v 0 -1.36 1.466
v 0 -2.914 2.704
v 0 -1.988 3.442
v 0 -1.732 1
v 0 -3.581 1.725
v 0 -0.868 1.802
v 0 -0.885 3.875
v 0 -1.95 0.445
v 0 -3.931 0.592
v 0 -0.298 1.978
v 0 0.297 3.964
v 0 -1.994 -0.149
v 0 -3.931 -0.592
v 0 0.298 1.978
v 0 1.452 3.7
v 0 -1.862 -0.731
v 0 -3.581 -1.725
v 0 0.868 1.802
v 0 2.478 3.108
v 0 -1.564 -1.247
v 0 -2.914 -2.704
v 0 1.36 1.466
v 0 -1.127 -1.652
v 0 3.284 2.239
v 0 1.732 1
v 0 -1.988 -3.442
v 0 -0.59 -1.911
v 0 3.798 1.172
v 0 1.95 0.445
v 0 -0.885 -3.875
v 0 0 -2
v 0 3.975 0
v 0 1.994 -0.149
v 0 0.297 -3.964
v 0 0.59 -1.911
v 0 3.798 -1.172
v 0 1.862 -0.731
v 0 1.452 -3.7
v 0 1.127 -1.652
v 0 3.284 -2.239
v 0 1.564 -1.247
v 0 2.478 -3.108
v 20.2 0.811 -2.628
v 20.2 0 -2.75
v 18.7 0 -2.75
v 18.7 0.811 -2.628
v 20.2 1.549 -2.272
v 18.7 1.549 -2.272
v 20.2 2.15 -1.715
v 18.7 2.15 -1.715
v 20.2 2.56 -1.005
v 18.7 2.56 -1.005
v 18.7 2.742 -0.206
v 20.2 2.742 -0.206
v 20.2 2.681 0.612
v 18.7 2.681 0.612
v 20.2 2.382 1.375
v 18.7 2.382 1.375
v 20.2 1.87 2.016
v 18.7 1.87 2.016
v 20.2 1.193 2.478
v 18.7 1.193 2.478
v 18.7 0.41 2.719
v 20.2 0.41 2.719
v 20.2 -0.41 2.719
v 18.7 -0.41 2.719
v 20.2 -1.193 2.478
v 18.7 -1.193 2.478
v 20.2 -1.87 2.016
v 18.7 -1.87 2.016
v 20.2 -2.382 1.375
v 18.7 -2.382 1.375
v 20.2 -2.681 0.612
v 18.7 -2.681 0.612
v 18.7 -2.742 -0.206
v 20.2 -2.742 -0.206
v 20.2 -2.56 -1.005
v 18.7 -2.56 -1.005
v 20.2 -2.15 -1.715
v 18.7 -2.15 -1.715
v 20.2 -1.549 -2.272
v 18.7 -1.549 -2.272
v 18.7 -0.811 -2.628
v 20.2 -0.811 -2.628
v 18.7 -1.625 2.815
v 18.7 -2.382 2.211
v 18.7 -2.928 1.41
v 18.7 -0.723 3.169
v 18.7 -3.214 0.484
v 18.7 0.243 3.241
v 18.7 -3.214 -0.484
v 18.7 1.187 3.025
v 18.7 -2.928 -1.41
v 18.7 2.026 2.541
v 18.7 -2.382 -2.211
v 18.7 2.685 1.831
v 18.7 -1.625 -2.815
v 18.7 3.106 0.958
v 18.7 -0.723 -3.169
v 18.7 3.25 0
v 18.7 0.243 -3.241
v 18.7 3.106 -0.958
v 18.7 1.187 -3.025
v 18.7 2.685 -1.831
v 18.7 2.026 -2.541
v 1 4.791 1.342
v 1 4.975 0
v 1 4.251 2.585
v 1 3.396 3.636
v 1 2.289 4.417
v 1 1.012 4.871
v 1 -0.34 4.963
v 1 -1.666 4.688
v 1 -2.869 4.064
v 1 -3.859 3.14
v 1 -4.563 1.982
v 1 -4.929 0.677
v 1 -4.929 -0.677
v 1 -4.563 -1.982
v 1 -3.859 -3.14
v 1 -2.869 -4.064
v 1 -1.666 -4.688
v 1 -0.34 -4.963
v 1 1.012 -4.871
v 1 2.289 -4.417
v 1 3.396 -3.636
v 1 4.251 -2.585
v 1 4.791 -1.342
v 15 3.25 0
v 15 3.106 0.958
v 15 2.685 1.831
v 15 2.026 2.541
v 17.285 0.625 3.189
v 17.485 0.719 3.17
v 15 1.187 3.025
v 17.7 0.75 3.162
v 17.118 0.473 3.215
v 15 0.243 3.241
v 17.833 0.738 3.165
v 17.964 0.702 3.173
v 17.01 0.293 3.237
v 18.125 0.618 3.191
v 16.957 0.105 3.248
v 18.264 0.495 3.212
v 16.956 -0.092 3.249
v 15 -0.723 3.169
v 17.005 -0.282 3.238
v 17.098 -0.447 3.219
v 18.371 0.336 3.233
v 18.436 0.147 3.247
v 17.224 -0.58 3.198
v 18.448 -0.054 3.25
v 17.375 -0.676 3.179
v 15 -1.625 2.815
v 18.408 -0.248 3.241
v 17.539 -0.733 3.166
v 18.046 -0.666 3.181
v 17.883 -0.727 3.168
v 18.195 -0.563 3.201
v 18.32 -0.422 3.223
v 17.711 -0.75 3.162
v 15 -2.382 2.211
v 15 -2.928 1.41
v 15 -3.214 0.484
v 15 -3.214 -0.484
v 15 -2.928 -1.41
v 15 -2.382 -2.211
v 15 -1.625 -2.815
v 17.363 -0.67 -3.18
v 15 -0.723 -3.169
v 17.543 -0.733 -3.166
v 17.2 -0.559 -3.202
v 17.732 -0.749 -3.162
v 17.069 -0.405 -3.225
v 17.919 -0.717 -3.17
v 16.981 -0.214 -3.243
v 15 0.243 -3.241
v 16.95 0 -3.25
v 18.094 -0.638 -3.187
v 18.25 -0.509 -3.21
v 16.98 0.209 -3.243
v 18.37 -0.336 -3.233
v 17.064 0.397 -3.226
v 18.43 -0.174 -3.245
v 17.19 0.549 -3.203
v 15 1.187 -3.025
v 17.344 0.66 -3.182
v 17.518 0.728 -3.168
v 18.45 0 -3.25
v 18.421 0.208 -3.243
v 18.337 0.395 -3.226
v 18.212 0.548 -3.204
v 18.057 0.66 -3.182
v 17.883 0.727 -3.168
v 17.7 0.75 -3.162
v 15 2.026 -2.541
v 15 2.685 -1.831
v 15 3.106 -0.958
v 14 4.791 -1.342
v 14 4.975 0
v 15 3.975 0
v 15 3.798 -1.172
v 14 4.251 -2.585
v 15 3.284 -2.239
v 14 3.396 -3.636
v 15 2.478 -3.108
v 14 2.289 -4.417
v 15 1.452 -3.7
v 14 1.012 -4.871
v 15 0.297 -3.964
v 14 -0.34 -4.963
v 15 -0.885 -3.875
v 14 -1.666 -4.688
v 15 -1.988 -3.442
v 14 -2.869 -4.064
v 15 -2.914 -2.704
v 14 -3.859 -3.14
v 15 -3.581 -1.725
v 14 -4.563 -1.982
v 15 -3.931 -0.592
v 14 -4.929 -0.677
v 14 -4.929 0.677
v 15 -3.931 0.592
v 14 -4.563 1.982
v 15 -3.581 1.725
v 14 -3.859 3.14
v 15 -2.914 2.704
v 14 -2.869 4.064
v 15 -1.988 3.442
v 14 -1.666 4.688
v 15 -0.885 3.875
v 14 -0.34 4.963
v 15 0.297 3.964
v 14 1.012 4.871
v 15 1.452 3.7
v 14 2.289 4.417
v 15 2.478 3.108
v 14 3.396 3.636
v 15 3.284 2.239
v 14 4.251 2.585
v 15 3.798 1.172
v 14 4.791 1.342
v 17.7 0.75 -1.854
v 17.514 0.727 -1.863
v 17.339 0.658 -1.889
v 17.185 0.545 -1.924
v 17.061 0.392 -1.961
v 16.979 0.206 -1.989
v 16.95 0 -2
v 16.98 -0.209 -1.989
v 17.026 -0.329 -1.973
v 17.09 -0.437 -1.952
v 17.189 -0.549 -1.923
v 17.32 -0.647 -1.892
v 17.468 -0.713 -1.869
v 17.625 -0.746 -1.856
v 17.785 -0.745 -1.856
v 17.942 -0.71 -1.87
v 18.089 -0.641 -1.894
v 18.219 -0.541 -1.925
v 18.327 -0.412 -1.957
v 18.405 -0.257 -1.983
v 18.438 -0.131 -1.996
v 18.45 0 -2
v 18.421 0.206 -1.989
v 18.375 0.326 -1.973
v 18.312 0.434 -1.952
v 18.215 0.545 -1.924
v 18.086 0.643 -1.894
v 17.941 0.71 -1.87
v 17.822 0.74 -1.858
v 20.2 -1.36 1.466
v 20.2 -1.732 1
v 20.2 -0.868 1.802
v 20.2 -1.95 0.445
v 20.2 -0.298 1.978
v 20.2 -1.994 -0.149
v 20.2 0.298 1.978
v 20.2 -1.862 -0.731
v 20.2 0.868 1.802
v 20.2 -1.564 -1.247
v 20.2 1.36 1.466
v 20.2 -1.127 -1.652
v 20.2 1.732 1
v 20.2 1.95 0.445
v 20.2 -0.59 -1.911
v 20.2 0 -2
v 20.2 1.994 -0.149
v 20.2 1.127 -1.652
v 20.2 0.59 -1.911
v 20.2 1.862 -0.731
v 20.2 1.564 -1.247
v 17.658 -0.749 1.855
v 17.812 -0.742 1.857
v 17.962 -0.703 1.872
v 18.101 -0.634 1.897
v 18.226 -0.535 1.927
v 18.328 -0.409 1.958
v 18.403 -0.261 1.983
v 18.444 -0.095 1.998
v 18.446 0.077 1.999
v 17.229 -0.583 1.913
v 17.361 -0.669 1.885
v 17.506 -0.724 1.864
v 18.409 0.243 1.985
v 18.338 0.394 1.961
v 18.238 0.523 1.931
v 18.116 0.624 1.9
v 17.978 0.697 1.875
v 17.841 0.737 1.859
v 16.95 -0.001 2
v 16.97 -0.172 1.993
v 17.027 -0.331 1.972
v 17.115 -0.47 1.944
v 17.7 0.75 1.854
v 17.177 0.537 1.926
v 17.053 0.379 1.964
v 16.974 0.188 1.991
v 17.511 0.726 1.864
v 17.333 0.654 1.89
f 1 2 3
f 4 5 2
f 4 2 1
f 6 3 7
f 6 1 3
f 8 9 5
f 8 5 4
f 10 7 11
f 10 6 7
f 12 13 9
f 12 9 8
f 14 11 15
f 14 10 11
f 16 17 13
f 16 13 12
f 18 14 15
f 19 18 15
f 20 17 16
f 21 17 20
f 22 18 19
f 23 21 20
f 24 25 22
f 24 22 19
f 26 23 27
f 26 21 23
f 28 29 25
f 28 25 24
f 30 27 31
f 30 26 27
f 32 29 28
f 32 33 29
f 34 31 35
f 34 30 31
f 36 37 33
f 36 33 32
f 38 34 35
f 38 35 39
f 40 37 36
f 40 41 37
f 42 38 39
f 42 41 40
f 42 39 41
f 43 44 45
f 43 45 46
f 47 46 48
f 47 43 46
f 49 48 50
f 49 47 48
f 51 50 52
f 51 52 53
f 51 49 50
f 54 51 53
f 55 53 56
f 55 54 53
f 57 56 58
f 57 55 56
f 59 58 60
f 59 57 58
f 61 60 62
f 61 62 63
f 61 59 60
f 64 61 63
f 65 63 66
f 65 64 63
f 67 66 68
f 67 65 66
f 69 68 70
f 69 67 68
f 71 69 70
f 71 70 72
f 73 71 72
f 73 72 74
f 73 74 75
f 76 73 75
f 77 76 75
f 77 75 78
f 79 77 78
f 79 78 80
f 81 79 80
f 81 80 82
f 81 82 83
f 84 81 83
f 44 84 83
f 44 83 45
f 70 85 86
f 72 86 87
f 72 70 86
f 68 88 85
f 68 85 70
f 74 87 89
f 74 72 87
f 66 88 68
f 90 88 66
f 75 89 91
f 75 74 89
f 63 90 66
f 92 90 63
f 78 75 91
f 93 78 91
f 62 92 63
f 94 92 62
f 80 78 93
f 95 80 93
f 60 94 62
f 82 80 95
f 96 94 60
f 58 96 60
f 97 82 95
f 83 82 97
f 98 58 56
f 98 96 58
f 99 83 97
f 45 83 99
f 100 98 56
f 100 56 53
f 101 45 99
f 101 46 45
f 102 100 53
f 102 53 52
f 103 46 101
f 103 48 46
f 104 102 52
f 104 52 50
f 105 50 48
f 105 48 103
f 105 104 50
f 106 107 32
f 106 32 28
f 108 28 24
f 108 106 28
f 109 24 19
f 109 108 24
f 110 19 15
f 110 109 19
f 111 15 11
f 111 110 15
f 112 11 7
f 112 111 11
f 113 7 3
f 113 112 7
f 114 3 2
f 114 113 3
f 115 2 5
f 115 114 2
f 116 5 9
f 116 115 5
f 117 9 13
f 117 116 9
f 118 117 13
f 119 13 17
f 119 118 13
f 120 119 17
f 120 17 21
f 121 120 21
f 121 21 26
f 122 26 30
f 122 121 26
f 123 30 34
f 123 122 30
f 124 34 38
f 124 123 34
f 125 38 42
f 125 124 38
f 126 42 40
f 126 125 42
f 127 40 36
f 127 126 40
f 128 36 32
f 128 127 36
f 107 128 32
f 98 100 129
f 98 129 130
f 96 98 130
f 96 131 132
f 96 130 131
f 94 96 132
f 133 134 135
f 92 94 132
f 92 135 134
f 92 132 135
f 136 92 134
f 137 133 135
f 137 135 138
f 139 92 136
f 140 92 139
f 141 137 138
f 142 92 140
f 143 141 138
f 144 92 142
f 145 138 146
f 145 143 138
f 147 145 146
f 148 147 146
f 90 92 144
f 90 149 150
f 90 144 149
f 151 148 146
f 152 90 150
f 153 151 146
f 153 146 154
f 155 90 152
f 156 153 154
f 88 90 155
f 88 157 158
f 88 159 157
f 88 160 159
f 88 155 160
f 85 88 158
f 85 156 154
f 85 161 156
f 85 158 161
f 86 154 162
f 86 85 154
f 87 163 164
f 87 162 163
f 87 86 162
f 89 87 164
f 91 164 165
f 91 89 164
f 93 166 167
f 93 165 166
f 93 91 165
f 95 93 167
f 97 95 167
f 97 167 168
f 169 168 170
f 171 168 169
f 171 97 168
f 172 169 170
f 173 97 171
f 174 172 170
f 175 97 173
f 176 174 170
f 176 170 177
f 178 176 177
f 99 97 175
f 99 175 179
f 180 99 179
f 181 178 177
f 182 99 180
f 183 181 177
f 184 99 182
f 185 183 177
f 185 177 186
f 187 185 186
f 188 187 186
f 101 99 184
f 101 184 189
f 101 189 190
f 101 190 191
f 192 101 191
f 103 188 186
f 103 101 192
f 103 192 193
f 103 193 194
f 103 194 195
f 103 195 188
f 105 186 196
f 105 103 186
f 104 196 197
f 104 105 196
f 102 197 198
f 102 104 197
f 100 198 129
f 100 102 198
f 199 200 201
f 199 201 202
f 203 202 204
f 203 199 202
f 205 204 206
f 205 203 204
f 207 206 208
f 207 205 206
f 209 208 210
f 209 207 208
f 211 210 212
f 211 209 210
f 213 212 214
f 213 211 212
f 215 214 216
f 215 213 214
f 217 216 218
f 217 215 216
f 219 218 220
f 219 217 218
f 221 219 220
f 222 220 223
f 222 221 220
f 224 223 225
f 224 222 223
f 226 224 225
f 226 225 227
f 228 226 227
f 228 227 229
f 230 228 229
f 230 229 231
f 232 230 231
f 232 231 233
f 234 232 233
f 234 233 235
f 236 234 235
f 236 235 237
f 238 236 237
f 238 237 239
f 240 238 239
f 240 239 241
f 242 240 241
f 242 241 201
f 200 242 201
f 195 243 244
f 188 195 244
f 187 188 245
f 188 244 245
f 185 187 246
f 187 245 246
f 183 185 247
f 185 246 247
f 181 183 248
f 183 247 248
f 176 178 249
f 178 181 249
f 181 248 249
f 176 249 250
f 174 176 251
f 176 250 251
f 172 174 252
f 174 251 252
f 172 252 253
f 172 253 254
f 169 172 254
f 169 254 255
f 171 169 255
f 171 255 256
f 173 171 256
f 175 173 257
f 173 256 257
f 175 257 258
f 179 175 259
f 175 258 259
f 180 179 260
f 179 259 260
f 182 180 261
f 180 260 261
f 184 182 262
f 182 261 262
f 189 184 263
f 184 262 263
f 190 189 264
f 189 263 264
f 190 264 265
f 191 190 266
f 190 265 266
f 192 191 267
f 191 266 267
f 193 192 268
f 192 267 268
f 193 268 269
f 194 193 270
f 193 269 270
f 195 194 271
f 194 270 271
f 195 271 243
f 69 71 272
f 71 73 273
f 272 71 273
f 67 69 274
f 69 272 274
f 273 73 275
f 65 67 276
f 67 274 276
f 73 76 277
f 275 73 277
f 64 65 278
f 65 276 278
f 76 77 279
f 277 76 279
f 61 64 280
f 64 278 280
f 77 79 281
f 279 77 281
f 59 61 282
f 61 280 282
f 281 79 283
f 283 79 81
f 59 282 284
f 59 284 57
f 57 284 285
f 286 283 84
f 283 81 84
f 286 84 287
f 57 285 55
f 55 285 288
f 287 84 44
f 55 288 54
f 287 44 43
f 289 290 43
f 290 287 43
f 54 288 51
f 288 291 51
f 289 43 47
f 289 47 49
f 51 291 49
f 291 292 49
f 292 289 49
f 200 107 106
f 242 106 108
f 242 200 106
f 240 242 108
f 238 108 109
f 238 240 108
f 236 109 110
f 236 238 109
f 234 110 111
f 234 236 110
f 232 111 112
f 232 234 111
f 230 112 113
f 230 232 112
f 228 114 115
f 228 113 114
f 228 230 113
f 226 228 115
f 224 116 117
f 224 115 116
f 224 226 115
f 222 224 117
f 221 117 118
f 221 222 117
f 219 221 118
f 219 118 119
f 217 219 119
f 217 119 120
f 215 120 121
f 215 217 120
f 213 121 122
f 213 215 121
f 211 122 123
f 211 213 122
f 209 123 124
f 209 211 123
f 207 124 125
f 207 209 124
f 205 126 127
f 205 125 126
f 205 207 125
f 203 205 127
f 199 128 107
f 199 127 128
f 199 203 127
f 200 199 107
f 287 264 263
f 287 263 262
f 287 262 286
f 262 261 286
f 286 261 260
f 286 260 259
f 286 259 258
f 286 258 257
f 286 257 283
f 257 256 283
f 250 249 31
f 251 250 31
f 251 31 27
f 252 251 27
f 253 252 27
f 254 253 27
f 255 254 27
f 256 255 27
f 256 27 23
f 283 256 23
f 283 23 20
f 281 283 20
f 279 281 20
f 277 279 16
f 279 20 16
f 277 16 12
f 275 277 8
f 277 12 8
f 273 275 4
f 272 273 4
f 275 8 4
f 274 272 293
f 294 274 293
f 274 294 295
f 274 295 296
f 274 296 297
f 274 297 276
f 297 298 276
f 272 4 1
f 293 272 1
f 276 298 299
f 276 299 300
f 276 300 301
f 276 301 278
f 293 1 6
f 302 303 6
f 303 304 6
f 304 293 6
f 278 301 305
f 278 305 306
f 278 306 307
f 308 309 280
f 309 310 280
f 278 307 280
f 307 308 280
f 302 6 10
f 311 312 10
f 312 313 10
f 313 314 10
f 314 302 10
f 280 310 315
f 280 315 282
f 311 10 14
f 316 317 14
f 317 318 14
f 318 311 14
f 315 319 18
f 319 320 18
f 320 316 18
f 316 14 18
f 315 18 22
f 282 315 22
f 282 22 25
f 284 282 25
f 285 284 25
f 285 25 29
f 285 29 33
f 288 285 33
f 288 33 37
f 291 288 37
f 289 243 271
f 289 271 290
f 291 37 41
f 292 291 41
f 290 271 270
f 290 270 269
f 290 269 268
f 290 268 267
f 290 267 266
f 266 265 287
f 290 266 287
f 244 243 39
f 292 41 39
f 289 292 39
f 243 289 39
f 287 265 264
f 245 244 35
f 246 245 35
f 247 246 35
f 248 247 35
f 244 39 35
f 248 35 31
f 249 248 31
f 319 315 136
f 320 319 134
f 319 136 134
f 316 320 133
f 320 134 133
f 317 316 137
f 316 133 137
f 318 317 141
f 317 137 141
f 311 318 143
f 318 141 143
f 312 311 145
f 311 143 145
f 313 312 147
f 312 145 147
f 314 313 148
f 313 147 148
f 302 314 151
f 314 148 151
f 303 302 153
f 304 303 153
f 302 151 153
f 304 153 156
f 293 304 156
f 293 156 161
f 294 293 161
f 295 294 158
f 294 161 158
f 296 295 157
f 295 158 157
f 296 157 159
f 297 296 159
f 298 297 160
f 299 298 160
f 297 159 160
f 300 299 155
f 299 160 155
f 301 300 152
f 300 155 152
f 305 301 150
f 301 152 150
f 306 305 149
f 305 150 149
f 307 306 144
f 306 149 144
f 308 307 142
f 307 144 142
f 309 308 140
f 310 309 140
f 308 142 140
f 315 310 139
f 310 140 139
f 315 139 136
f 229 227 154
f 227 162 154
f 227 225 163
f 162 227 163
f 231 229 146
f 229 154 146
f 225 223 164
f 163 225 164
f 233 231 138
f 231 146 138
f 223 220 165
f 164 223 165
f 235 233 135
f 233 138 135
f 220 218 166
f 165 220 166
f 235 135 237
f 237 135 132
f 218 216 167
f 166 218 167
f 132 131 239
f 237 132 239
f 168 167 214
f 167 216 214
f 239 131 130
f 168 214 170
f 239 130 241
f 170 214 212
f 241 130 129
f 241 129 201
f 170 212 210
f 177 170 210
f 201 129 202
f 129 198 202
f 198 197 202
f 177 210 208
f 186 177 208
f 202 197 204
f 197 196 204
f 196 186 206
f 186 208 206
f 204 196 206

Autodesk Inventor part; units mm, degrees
ref_plane "YZ Plane" through (0, 0, 0) normal (1, 0, 0) x (0, 1, 0)
ref_plane "XZ Plane" through (0, 0, 0) normal (0, 1, 0) x (-1, 0, 0)
sketch "Sketch1" plane through (0, 0, 0) normal (0, 0, 1) x (1, 0, 0)
  line L0 (0, 0) -> (0, 4.975)
  line L1 (0, 4.975) -> (15, 4.975)
  line L2 (15, 4.975) -> (15, 3.25)
  line L3 (15, 3.25) -> (20.2, 3.25)
  line L4 (20.2, 3.25) -> (20.2, 0)
  line L5 (20.2, 0) -> (0, 0)
  dimension "d2" = 20.2
  dimension "d3" = 15
  dimension "d19" = 9.95
  dimension "d20" = 6.5
revolve "Revolution1" add sketch "Sketch1" angle 360 about axis through (20.2, 0, 0) along (-1, 0, 0)
thread "Thread1" size "M10x1.5" class "6g" standard "ANSI Metric M Profile" full length
chamfer "Chamfer1" distance 1 angle 45 2 edges at (15, -4.975, 0) (0, -4.975, 0)
hole "Hole1" at (20.2, 0, 0) direction (-1, 0, 0) diameter 4 end through all
ref_plane "Work Plane1" through (17.6, 0, -3.25) normal (0, 0, 1) x (1, 0, 0)
sketch "Sketch2" plane through (17.6, 0, -3.25) normal (0, 0, 1) x (1, 0, 0)
  line L0 (2.6, -3.25) -> (2.6, 3.25) projected
  line L1 (-2.6, -3.25) -> (-2.6, 3.25) projected
  point P0 (-17.6, 0)
  point P1 (0.1, 0)
  point P2 (2.6, 0)
  dimension "d21" = 2.5
hole "Hole2" at (17.7, 0, -3.25) direction (0, 0, 1) diameter 1.5 end through all
sketch "Sketch3" plane through (20.2, 0, 0) normal (1, 0, 0) x (0, 0, -1)
  circle A0 centre (0, 0) radius 2.75
  circle A1 centre (0, 0) radius 3.25 projected
  dimension "d29" = 5.5
extrude "Extrusion1" cut sketch "Sketch3" against normal blind 1.5
properties part number "worm_1_20_conrad_with_bolt_hole" material "Steel"
